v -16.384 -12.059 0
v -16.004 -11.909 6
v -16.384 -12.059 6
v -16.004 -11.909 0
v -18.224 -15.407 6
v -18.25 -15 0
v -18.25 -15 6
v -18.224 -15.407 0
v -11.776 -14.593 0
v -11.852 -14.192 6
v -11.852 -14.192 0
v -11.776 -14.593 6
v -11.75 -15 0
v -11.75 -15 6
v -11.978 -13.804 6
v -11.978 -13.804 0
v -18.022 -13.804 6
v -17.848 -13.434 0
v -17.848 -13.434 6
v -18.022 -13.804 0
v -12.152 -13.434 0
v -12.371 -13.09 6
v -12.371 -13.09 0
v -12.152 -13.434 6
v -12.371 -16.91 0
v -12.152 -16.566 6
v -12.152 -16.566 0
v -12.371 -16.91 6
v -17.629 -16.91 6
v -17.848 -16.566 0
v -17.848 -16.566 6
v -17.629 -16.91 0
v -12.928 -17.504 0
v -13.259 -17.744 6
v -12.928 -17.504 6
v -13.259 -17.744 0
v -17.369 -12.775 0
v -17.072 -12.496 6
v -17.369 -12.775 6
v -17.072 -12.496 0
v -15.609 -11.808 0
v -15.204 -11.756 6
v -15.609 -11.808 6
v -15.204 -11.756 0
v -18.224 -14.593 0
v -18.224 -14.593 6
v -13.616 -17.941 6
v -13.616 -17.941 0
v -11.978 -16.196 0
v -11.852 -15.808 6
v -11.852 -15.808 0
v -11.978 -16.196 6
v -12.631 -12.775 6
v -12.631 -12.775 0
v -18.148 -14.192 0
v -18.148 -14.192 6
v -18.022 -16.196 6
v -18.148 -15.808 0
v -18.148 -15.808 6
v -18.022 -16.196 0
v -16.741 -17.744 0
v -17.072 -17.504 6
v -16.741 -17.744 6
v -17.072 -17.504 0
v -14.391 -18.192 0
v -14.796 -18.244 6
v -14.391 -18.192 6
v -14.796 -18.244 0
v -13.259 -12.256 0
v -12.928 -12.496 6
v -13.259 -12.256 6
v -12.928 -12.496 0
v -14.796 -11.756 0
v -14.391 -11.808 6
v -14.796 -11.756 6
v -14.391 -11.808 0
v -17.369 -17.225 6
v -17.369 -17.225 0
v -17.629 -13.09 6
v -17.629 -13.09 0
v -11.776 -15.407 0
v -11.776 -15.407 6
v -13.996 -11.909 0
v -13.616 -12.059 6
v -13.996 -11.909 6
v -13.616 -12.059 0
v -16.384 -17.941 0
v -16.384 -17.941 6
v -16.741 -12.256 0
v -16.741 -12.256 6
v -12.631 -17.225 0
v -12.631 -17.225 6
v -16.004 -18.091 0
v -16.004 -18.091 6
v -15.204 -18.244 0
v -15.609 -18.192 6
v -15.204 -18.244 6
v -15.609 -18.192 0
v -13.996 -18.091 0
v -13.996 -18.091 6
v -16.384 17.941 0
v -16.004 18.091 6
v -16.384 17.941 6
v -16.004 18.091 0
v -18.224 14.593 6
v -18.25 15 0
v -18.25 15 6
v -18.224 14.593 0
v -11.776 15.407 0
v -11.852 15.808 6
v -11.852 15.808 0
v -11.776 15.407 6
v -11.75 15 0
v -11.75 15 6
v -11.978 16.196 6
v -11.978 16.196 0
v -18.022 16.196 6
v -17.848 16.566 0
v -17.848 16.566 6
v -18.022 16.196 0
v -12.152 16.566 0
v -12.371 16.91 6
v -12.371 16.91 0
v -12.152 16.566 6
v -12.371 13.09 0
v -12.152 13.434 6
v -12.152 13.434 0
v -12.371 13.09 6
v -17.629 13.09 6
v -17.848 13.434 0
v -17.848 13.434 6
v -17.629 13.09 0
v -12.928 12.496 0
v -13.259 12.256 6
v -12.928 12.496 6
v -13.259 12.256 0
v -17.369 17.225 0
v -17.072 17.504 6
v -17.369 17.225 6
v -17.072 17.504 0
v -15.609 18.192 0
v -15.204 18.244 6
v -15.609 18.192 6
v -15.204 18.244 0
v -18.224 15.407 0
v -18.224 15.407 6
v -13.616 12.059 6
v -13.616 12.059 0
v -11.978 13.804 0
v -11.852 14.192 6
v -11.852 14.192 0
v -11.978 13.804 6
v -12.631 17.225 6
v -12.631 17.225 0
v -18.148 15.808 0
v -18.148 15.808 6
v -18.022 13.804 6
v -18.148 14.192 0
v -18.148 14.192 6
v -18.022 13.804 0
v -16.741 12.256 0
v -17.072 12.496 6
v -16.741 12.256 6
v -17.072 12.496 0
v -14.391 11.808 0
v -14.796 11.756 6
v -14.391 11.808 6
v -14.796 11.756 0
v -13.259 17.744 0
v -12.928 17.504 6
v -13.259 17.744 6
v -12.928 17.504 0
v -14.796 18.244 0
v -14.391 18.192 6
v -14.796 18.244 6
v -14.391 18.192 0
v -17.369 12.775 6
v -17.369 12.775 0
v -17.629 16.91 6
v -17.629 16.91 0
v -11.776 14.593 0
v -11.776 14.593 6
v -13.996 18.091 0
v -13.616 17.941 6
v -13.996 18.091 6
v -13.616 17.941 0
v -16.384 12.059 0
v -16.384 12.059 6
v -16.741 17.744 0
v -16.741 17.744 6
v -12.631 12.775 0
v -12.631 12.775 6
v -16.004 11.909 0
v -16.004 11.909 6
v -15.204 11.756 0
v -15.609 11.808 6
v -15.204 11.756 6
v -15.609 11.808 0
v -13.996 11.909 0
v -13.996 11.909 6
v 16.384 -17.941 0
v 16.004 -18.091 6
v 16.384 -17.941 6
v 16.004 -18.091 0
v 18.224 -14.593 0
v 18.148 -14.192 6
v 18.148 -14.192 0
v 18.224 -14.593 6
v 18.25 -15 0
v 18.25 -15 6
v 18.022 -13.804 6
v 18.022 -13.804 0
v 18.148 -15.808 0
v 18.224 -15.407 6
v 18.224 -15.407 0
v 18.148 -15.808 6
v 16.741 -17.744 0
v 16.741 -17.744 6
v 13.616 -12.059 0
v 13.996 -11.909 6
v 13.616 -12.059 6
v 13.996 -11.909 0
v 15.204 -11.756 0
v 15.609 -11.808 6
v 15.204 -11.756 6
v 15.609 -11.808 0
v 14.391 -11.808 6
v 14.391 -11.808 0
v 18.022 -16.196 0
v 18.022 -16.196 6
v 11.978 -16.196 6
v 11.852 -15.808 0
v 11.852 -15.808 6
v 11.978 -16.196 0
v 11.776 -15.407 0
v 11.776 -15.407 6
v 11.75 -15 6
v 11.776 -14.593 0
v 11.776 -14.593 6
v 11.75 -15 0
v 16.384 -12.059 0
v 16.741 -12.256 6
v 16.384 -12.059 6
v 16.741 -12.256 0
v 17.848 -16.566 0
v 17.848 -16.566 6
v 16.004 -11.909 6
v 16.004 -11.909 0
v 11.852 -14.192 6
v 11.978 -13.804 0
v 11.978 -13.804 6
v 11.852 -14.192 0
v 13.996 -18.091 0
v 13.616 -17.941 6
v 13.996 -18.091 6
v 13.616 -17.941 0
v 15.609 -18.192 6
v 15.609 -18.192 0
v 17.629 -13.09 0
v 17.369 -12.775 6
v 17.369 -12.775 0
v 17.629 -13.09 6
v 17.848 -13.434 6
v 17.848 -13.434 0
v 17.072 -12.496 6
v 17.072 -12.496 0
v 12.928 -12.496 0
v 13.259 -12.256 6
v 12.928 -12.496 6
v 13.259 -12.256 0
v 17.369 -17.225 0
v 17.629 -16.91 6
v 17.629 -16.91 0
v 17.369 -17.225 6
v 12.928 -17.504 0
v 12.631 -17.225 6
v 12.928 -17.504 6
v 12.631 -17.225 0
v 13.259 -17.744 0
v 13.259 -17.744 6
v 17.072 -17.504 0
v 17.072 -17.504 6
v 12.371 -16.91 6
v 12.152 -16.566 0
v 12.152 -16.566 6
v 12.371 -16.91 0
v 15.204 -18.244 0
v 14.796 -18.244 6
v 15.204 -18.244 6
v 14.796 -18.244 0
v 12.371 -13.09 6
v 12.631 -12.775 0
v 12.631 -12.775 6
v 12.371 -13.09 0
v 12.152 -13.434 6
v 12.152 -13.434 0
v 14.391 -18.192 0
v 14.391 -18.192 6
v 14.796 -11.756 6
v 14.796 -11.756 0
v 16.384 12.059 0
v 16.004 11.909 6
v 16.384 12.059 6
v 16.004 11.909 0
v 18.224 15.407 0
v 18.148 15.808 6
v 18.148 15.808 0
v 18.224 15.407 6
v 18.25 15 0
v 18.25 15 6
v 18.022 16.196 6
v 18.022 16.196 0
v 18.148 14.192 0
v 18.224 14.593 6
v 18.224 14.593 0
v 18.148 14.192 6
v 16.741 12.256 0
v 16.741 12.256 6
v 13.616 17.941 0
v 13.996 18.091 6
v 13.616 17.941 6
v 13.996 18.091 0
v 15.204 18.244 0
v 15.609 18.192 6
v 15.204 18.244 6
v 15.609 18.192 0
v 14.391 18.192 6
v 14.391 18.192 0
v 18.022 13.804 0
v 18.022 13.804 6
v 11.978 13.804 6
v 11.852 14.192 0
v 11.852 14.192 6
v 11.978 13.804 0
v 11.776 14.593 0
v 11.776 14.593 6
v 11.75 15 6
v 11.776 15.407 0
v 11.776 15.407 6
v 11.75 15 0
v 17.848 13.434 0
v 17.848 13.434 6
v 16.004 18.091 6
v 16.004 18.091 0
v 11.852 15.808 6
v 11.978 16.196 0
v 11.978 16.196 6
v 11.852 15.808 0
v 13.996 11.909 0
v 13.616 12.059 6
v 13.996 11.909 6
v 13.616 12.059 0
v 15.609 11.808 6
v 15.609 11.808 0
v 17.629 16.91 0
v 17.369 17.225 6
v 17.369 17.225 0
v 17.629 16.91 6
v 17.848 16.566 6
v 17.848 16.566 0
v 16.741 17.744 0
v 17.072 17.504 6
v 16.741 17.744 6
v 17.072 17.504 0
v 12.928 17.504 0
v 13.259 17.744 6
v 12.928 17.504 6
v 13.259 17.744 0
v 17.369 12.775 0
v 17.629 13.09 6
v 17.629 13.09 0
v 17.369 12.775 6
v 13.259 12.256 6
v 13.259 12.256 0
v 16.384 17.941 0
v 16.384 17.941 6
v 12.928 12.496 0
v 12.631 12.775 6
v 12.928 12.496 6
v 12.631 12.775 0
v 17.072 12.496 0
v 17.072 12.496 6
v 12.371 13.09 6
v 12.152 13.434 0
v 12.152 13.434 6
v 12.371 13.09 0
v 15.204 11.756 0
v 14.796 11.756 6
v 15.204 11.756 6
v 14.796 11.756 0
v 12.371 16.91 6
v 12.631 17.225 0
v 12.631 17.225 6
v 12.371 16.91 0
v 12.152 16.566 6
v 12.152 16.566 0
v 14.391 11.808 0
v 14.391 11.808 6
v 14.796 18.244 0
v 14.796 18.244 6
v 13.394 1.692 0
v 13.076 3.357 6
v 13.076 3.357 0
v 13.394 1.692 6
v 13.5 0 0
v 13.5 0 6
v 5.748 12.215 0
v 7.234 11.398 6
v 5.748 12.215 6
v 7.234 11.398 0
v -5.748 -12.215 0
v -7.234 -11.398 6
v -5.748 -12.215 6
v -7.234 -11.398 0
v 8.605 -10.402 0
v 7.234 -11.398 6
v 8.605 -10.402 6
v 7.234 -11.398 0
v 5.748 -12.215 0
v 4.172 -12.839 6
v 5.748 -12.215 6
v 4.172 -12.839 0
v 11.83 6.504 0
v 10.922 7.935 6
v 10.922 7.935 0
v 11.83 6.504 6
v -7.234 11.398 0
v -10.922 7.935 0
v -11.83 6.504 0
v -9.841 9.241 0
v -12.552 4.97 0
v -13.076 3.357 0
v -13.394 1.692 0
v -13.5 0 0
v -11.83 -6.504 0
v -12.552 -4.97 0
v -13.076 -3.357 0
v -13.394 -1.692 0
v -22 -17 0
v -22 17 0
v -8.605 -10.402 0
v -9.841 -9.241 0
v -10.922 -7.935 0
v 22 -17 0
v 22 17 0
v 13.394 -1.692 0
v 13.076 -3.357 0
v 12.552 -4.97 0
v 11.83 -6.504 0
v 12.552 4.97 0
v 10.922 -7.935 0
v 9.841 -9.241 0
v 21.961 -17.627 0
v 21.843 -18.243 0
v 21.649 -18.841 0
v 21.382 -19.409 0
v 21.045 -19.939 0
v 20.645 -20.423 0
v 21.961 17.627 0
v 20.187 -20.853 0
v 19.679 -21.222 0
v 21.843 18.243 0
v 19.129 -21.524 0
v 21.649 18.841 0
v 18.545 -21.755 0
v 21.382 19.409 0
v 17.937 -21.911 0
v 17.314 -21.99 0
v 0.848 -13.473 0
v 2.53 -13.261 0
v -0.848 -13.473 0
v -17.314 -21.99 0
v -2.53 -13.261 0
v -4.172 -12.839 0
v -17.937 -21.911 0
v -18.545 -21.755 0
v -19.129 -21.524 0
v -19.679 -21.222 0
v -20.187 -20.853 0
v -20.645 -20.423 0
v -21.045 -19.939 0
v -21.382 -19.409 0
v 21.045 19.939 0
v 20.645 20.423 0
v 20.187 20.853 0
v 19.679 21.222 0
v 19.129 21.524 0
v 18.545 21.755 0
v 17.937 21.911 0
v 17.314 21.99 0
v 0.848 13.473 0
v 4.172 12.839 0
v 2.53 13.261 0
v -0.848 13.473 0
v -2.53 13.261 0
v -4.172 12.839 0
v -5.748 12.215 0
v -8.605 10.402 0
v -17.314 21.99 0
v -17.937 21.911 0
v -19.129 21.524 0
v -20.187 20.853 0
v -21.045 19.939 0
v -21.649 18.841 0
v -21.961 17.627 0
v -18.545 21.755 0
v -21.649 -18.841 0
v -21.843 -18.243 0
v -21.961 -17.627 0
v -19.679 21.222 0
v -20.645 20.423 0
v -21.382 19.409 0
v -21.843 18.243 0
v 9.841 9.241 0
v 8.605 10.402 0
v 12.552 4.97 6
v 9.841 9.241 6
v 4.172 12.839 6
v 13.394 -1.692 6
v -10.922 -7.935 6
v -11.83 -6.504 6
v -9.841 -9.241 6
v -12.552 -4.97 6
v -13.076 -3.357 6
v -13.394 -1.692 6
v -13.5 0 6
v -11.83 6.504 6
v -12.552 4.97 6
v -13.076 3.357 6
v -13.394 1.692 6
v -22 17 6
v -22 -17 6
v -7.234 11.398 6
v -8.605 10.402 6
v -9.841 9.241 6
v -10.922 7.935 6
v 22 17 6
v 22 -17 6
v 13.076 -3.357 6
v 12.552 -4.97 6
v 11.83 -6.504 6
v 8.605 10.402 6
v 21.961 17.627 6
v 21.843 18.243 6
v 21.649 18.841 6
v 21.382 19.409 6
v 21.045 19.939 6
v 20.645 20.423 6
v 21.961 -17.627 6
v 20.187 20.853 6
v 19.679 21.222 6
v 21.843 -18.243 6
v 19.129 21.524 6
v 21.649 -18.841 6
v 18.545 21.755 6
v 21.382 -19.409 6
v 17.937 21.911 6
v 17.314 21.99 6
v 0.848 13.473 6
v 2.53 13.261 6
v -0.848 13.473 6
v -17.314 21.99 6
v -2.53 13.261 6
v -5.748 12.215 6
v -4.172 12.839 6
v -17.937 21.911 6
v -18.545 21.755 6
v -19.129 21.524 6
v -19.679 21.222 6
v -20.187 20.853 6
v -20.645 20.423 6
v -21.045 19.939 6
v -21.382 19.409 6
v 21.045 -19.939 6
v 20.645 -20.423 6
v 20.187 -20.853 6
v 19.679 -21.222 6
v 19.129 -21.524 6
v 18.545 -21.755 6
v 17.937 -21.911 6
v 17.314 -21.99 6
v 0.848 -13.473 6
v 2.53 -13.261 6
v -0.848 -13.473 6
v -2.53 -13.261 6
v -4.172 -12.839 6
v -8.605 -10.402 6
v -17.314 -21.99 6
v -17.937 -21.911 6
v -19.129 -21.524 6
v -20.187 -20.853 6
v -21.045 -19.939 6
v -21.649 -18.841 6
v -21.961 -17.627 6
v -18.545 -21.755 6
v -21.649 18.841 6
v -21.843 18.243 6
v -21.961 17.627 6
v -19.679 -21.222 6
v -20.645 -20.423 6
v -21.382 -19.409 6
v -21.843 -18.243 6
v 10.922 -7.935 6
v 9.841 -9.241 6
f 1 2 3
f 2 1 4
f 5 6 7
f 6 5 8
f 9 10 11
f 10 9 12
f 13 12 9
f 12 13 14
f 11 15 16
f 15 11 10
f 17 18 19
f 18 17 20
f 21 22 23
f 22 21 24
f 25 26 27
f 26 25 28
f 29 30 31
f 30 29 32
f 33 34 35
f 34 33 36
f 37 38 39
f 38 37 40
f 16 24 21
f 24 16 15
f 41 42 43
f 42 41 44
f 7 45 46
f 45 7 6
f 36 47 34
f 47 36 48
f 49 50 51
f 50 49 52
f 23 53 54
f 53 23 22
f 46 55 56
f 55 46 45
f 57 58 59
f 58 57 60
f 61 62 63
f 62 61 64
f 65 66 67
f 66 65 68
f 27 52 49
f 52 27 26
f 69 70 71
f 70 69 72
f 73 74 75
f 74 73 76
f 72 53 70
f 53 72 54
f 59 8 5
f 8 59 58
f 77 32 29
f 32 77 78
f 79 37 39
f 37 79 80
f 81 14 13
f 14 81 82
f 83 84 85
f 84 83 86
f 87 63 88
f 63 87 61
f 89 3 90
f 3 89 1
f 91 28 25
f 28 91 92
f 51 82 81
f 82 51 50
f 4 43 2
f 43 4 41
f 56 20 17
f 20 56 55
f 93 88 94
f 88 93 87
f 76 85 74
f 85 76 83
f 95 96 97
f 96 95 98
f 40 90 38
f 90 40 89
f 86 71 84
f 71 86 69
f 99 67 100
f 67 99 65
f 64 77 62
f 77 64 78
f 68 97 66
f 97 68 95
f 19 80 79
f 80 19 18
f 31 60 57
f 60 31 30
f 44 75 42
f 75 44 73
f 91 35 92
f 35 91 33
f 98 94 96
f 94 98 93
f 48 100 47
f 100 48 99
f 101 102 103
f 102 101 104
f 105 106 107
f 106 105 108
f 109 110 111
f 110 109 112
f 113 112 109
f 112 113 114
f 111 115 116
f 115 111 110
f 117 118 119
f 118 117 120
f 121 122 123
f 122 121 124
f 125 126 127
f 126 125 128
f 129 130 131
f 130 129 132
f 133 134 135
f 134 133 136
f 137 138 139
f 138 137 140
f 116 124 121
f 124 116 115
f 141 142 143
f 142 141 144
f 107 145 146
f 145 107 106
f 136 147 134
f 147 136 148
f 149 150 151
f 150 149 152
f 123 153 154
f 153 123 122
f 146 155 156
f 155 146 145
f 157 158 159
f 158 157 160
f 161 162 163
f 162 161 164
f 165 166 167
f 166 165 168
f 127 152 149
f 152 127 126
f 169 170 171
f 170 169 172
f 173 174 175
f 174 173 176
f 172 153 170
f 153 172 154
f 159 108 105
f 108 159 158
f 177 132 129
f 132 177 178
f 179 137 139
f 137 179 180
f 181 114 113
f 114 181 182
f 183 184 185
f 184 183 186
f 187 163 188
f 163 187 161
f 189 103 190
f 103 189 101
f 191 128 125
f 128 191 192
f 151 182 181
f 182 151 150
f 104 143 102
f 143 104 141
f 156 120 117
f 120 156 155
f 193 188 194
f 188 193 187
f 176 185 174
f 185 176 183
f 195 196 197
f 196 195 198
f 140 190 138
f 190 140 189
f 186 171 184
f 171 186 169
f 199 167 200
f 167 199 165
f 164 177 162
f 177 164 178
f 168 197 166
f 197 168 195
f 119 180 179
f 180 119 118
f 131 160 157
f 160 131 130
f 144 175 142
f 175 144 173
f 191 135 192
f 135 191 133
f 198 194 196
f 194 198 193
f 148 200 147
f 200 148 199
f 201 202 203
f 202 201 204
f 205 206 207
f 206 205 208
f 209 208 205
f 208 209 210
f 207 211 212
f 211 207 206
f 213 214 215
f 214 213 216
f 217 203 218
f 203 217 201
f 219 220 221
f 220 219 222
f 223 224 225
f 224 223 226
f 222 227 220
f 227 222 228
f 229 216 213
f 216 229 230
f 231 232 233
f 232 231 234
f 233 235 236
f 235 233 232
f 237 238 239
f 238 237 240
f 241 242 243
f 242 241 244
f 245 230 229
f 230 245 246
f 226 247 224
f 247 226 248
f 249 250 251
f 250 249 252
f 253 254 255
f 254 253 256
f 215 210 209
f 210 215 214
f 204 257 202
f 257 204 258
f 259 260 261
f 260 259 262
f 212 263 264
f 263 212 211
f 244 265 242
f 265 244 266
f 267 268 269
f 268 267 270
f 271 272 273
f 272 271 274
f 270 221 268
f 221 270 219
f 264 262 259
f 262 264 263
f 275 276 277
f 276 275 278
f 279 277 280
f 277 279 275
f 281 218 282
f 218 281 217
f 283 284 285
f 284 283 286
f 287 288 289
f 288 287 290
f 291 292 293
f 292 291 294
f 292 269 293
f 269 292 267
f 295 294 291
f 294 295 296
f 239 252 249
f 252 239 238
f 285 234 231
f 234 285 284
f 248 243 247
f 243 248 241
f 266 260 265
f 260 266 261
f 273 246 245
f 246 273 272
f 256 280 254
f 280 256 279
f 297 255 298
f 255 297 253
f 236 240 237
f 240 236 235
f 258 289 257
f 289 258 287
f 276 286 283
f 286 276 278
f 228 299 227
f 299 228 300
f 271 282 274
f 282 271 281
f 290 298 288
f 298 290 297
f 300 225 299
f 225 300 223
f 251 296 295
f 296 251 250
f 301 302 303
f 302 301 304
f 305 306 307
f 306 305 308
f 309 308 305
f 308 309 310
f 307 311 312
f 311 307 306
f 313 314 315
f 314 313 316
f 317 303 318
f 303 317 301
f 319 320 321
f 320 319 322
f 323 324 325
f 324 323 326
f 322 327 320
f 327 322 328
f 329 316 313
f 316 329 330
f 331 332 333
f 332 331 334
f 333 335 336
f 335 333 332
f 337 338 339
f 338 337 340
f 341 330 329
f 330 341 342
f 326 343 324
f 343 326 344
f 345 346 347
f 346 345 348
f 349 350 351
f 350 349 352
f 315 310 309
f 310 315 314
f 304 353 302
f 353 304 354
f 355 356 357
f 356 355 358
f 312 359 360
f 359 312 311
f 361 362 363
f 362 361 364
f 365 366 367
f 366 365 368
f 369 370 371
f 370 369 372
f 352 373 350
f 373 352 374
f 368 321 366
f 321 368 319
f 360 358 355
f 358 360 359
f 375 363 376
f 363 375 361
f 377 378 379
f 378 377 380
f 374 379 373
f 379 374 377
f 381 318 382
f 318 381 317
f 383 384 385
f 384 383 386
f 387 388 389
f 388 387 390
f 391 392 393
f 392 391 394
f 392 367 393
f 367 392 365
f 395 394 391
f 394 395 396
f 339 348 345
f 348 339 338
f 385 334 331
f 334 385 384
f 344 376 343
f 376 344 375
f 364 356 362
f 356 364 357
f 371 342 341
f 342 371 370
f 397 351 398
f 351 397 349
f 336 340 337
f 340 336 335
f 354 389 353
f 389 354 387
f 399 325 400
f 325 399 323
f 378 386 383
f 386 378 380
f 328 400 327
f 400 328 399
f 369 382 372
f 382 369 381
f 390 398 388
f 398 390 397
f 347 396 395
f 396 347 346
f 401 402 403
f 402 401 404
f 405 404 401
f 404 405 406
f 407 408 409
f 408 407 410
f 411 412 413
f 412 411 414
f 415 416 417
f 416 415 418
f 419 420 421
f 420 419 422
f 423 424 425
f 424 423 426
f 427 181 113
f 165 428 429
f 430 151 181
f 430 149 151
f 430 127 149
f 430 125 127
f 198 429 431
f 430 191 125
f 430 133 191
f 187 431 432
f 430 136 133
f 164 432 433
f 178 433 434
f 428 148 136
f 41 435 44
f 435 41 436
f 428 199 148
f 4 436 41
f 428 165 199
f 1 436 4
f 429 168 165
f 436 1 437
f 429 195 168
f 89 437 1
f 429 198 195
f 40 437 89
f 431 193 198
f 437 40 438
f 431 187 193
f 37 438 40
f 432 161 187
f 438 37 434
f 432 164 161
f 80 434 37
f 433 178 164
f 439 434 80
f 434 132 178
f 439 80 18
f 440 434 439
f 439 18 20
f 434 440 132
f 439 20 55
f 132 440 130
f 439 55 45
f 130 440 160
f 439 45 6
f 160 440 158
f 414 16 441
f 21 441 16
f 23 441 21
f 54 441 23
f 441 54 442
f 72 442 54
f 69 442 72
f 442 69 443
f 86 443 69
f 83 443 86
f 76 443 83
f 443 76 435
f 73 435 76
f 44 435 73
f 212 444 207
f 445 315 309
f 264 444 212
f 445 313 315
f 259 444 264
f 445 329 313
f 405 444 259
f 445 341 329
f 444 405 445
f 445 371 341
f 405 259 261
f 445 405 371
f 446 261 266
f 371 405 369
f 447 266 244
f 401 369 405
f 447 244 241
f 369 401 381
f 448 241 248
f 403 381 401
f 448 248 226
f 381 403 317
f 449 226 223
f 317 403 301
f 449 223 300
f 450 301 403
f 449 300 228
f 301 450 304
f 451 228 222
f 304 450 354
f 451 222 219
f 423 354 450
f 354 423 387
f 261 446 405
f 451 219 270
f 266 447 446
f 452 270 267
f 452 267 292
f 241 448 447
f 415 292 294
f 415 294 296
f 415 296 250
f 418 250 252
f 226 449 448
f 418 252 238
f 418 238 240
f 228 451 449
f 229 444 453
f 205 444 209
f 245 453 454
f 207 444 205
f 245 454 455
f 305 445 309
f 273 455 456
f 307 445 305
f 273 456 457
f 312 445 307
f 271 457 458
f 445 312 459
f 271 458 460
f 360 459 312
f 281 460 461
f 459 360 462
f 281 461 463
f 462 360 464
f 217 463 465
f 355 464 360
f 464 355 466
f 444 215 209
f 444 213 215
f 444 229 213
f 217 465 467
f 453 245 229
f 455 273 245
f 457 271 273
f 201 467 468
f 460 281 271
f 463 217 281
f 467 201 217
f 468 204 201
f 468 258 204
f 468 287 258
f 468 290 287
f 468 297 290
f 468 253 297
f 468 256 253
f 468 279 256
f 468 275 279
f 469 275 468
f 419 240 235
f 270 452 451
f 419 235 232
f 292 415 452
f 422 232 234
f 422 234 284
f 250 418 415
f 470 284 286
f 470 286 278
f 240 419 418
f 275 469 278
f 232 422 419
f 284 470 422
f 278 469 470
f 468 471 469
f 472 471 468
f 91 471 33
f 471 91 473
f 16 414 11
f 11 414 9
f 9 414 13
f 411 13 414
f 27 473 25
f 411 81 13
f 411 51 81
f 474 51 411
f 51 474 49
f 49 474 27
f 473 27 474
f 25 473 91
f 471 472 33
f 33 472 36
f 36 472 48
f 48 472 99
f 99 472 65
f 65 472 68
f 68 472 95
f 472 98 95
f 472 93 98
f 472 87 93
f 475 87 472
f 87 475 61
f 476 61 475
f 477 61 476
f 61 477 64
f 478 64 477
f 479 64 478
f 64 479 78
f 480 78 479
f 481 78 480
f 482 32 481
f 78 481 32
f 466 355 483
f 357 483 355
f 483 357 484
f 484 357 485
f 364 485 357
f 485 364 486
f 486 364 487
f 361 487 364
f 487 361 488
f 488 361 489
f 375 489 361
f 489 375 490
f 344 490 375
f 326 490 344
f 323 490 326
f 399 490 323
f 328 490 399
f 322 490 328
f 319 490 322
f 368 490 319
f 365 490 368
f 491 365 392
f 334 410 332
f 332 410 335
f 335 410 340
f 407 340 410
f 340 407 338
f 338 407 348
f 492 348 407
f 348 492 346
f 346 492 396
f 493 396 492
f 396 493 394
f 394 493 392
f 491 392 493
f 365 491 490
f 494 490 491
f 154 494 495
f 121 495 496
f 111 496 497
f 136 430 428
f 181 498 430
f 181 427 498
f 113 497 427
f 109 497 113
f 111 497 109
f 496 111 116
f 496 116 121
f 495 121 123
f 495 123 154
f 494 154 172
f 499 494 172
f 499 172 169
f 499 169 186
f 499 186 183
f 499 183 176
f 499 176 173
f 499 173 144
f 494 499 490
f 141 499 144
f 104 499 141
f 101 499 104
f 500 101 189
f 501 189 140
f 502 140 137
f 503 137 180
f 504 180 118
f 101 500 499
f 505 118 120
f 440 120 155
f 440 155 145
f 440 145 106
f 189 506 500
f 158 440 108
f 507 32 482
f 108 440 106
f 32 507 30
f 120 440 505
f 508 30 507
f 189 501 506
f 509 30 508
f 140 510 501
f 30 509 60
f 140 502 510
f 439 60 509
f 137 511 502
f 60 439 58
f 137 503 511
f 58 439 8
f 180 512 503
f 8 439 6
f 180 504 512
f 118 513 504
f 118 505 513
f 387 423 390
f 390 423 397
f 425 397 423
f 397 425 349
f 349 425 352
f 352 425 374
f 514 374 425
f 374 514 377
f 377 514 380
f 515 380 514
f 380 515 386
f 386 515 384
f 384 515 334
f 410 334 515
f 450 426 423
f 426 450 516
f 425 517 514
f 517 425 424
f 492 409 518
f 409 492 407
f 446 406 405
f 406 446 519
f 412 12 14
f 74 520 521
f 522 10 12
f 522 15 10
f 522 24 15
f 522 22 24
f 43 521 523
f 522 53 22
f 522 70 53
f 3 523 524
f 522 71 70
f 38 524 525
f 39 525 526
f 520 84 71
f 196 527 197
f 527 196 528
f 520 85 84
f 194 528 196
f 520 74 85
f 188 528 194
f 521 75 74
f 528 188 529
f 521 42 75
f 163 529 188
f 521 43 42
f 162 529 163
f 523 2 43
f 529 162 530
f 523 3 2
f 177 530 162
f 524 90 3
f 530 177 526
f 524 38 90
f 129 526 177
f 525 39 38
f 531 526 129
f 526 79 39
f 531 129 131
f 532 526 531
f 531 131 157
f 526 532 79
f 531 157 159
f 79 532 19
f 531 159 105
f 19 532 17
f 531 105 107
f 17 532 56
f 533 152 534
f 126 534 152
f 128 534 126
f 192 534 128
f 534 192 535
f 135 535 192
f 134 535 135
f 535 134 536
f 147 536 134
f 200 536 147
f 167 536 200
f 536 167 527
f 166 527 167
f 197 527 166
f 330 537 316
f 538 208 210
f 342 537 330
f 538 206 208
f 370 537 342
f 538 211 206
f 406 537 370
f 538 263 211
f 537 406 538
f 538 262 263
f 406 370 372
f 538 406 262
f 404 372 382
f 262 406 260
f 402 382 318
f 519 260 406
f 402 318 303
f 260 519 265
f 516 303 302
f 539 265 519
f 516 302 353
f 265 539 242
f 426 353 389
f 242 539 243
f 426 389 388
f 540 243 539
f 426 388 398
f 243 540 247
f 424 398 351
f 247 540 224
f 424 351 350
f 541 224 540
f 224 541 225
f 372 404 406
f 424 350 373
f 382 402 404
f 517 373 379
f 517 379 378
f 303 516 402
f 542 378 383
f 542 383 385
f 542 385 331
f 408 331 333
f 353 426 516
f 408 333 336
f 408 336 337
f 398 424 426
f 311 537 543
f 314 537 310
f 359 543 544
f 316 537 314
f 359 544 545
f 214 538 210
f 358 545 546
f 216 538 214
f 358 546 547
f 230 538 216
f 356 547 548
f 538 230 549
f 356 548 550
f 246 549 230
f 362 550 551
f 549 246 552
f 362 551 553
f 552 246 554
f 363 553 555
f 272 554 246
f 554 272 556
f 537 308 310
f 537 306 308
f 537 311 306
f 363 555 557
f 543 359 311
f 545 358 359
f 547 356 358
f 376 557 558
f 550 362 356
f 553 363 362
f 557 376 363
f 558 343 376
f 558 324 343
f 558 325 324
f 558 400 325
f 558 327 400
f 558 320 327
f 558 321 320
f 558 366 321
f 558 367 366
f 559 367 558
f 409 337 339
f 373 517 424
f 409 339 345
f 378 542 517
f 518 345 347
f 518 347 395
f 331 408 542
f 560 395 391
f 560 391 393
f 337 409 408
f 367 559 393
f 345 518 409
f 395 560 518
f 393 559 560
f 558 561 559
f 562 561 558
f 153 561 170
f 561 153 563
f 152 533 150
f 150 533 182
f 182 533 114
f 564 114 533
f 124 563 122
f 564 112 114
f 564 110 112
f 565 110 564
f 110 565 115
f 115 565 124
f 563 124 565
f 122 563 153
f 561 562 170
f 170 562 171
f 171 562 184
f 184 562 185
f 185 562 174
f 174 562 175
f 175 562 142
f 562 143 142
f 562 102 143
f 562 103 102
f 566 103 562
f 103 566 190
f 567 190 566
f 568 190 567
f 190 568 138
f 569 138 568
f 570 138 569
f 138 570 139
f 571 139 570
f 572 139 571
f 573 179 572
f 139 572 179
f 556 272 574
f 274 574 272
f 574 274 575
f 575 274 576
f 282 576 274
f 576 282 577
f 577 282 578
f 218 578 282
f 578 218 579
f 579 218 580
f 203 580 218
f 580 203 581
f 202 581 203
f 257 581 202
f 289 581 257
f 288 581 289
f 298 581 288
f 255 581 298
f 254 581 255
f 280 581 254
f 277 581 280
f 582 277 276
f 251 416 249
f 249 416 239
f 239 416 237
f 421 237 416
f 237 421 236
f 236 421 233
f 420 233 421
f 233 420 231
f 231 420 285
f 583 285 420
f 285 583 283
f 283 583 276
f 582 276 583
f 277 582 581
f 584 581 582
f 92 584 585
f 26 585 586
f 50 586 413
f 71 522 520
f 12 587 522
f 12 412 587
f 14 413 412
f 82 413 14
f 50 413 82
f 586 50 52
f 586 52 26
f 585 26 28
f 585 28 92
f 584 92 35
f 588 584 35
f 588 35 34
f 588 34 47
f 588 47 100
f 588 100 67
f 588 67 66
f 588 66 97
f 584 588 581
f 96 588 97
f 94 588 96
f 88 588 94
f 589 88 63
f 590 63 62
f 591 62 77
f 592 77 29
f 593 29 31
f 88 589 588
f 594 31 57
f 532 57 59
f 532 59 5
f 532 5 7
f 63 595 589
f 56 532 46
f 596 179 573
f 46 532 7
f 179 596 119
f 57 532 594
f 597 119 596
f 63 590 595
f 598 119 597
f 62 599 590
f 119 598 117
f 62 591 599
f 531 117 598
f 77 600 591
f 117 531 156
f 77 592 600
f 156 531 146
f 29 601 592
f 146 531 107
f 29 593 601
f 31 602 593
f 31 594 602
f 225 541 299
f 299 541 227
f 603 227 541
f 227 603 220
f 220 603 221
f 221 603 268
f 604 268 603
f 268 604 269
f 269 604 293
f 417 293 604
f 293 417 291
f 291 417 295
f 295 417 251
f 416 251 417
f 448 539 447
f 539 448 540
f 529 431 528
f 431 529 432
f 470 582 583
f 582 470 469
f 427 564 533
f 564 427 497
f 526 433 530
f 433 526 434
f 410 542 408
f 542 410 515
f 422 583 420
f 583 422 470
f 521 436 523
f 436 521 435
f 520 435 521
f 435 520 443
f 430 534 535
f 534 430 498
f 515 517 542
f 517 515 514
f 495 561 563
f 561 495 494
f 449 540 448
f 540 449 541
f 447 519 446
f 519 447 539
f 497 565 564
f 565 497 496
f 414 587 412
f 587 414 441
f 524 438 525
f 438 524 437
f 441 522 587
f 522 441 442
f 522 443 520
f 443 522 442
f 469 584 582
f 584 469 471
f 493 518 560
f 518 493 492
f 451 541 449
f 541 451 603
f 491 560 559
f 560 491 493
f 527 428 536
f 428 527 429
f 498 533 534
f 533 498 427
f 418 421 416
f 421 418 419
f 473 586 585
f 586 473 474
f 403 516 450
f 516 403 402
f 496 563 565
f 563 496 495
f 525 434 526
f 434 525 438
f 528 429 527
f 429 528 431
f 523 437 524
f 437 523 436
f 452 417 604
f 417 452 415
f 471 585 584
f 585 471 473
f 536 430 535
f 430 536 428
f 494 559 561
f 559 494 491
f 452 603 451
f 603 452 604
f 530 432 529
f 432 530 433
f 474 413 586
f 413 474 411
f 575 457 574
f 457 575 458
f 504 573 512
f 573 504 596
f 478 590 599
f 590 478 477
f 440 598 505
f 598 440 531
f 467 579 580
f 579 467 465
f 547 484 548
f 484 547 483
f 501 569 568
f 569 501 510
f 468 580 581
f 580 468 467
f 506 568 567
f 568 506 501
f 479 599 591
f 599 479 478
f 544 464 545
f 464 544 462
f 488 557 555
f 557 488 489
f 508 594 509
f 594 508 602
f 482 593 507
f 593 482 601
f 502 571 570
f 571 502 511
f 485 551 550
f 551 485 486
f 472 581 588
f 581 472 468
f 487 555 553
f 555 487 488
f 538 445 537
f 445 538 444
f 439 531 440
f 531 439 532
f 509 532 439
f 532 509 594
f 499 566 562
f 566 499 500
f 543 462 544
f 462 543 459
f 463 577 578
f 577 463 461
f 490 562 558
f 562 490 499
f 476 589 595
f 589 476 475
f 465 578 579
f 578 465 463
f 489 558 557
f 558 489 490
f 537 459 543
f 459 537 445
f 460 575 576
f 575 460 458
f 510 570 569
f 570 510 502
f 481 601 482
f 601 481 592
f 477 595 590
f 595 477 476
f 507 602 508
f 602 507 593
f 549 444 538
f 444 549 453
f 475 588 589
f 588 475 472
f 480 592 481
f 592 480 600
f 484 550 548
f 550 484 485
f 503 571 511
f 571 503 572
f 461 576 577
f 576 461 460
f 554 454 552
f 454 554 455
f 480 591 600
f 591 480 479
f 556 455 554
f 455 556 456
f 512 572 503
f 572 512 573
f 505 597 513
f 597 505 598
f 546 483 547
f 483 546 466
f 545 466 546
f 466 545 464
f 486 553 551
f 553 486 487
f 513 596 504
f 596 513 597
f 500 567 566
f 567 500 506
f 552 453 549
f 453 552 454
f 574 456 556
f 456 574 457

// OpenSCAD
$fn = 50;

difference() {
	union() {
		hull() {
			translate(v = [-17.0, 17.0, 0]) {
				cylinder(h = 6, r = 5);
			}
			translate(v = [17.0, 17.0, 0]) {
				cylinder(h = 6, r = 5);
			}
			translate(v = [-17.0, -17.0, 0]) {
				cylinder(h = 6, r = 5);
			}
			translate(v = [17.0, -17.0, 0]) {
				cylinder(h = 6, r = 5);
			}
		}
	}
	union() {
		translate(v = [-15.0, -15.0, -100.0]) {
			cylinder(h = 200, r = 3.25);
		}
		translate(v = [-15.0, 15.0, -100.0]) {
			cylinder(h = 200, r = 3.25);
		}
		translate(v = [15.0, -15.0, -100.0]) {
			cylinder(h = 200, r = 3.25);
		}
		translate(v = [15.0, 15.0, -100.0]) {
			cylinder(h = 200, r = 3.25);
		}
		translate(v = [-15.0, -15.0, -100.0]) {
			cylinder(h = 200, r = 1.8);
		}
		translate(v = [-15.0, 15.0, -100.0]) {
			cylinder(h = 200, r = 1.8);
		}
		translate(v = [15.0, -15.0, -100.0]) {
			cylinder(h = 200, r = 1.8);
		}
		translate(v = [15.0, 15.0, -100.0]) {
			cylinder(h = 200, r = 1.8);
		}
		cylinder(h = 6, r = 13.5);
	}
}
